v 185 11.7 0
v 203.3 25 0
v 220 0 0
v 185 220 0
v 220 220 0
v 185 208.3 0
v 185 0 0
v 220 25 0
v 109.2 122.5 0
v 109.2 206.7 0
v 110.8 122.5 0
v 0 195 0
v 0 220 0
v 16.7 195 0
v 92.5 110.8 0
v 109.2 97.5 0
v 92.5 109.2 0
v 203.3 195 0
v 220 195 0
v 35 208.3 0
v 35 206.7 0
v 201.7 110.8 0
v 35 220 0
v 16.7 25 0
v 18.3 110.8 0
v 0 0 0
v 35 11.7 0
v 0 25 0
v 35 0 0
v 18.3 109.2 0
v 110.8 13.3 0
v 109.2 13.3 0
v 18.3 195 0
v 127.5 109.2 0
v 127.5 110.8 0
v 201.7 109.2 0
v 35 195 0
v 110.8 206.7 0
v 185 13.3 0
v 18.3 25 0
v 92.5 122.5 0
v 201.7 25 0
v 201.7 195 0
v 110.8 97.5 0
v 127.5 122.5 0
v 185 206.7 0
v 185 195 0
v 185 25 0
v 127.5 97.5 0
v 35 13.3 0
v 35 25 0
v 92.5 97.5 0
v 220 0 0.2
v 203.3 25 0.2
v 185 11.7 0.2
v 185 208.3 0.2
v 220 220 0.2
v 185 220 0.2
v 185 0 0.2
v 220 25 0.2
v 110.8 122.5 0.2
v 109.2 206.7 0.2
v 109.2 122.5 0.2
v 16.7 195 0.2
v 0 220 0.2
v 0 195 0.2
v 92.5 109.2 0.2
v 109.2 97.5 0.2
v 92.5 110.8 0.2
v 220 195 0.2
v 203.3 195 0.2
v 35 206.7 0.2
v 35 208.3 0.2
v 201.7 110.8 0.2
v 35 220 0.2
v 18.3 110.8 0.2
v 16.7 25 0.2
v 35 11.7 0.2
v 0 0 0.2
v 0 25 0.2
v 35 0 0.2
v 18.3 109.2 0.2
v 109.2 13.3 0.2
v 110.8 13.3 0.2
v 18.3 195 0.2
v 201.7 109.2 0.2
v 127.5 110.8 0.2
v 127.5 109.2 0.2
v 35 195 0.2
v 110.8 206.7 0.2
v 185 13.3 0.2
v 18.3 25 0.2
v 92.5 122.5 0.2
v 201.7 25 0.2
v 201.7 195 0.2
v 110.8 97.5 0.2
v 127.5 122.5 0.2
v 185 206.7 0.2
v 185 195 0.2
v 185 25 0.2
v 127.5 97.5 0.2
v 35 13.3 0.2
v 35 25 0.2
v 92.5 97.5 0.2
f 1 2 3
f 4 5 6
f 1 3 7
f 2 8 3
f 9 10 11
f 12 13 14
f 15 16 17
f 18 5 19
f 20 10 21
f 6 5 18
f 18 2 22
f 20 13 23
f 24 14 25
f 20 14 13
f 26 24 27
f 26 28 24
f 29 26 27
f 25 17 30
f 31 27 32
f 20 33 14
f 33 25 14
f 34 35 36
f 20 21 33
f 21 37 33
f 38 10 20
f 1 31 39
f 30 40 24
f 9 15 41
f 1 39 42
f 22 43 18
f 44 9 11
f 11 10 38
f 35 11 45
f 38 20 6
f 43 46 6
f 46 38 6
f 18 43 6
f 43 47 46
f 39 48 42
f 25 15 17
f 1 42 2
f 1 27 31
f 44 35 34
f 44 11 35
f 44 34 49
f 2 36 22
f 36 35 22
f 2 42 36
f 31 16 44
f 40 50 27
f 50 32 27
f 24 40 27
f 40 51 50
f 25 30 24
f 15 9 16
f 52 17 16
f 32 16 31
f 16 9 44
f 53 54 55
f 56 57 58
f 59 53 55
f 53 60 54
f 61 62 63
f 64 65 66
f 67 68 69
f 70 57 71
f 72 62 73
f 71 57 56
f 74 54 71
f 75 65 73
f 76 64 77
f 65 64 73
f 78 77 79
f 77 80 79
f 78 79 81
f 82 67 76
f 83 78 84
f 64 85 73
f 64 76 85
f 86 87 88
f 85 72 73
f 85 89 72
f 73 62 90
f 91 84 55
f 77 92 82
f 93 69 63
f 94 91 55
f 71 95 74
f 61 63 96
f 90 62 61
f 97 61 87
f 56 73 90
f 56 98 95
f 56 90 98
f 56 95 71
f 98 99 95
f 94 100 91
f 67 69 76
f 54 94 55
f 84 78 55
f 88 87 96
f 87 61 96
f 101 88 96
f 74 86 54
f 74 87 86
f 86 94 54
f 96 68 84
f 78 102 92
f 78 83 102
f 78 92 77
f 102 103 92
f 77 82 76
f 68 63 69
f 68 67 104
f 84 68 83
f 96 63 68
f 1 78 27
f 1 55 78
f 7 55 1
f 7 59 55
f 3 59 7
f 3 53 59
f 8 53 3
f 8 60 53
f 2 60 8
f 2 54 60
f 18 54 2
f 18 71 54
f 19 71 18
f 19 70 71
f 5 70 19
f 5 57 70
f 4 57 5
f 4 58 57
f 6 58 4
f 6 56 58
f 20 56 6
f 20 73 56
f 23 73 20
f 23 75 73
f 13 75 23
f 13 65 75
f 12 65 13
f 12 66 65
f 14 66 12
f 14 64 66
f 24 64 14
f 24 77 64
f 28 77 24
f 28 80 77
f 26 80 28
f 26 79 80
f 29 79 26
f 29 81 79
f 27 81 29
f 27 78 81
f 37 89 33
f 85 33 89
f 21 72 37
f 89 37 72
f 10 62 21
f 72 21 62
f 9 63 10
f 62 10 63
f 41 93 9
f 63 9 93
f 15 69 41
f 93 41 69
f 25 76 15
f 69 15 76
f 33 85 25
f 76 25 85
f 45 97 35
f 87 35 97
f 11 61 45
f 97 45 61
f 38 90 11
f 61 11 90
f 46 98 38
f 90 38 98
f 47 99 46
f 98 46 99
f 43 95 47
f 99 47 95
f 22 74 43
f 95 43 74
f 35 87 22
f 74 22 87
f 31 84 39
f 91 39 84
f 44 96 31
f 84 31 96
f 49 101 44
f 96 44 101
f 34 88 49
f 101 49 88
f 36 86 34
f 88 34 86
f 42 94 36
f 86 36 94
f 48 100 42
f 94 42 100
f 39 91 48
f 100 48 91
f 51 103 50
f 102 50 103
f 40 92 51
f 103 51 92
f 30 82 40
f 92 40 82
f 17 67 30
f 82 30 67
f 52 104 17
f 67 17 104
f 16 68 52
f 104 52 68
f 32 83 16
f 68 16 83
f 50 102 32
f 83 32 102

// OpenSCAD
// resolution or number of sides for circles
$fn = 90+0; 
// Width of print bed
t_bed_width = 220 ;
// Depth of print bed
t_bed_depth = 220;
// Shape to be printed at test points ("circle" or "square")
t_shape = "square";  //[circle,square]
// Print extra shape in center?
t_shape_center = "true"; // [true,false]
// Number of test columns
t_shape_xcount = 2; // [0,1,2,3,4,5,6,7,8,9,10]
// Number of test rows
t_shape_ycount = 2; // [0,1,2,3,4,5,6,7,8,9,10]
// Width of test shape
t_shape_xsize = 35; // width of shape or diameter of circle
// Depth of test shape
t_shape_ysize = 25; // depth of shape
// Width of connecting grid
t_line_width = 1.6; // 1.6 works well, 0 to skip
// Thickness of test print
t_thickness = 0.2; // layer height
// Safety border around edges of bed
t_bed_border = 0; // safety margin around edge of bed

/* [Hidden] */
t_print_width = t_bed_width - t_shape_xsize - (2*t_bed_border);
t_print_depth = t_bed_depth - t_shape_ysize - (2*t_bed_border);

// Bed size
//%square([t_bed_width, t_bed_depth]); 

// Grid area
translate([t_bed_width/2,t_bed_depth/2]){
    %square([t_print_width,t_print_depth], true);
}

// Print area
translate([t_bed_width/2,t_bed_depth/2]){
    %square([t_bed_width-(2*t_bed_border),t_bed_depth-(2*t_bed_border)], true);
}

linear_extrude(height = t_thickness) { 
    // shift everything to center in print area
    translate([(t_shape_xsize/2)+t_bed_border,(t_shape_ysize/2)+t_bed_border,0]){
        // intervals between printed shapes
        t_increment_x = t_print_width / (t_shape_xcount-1);
        t_increment_y = t_print_depth / (t_shape_ycount-1);
        t_center_x = 0;
        t_center_y = 0;
    
        // draw grid
        // draw horizontal lines along X axis
        if(t_shape_ycount > 0) {
            for(t_curr_x = [0:t_shape_xcount-1]){
                translate([t_center_x, t_print_depth/2, 0]){
                    square([t_line_width,t_print_depth], true);
                }
                t_center_x = t_curr_x * t_increment_x;
            }
        }
        if(t_shape_xcount > 0 ) {
            // draw vertical lines along Y axis
            for(t_curr_y = [0:t_shape_ycount-1]){
                translate([t_print_width/2, t_center_y, 0]){
                    square([t_print_width, t_line_width], true);
                }
                t_center_y = t_curr_y * t_increment_y;
            }
        }
        // draw shapes
        if(t_shape_xcount > 0){
            t_center_x = 0;
            for(t_curr_x = [0:t_shape_xcount-1]){
                t_center_y = 0;
                for(t_curr_y = [0:t_shape_ycount-1]){
                    translate([t_center_x,t_center_y]){
                        if (t_shape == "circle") { 
                            circle(d=t_shape_xsize);
                            } else { 
                           square([t_shape_xsize,t_shape_ysize],true);
                        }
                    }
                    t_center_y = t_curr_y * t_increment_y;
                }
                t_center_x = t_curr_x * t_increment_x;
            }
        }
        // print bed center shape and grid if enabled
        if(t_shape_center == "true" ) {
            t_center_x= (t_bed_width-(2*t_bed_border )-(t_shape_xsize)) /2;
            t_center_y=(t_bed_depth-(2*t_bed_border )-(t_shape_ysize)) /2;
             translate([t_center_x,t_center_y]){
                if (t_shape == "circle") { 
                   circle(d=t_shape_xsize);
                } else { 
                   square([t_shape_xsize,t_shape_ysize],true);
                }
            }
            if(t_shape_ycount > 0){
                // draw horizontal lines along X axis
                translate([t_center_x, t_print_depth/2, 0]){
                    square([t_line_width,t_print_depth], true);
                }
            }
            if(t_shape_xcount > 0){
                // draw vertical lines along Y axis
                translate([t_print_width/2, t_center_y, 0]){
                    square([t_print_width, t_line_width], true);
                }
            }
        }
    }
}
